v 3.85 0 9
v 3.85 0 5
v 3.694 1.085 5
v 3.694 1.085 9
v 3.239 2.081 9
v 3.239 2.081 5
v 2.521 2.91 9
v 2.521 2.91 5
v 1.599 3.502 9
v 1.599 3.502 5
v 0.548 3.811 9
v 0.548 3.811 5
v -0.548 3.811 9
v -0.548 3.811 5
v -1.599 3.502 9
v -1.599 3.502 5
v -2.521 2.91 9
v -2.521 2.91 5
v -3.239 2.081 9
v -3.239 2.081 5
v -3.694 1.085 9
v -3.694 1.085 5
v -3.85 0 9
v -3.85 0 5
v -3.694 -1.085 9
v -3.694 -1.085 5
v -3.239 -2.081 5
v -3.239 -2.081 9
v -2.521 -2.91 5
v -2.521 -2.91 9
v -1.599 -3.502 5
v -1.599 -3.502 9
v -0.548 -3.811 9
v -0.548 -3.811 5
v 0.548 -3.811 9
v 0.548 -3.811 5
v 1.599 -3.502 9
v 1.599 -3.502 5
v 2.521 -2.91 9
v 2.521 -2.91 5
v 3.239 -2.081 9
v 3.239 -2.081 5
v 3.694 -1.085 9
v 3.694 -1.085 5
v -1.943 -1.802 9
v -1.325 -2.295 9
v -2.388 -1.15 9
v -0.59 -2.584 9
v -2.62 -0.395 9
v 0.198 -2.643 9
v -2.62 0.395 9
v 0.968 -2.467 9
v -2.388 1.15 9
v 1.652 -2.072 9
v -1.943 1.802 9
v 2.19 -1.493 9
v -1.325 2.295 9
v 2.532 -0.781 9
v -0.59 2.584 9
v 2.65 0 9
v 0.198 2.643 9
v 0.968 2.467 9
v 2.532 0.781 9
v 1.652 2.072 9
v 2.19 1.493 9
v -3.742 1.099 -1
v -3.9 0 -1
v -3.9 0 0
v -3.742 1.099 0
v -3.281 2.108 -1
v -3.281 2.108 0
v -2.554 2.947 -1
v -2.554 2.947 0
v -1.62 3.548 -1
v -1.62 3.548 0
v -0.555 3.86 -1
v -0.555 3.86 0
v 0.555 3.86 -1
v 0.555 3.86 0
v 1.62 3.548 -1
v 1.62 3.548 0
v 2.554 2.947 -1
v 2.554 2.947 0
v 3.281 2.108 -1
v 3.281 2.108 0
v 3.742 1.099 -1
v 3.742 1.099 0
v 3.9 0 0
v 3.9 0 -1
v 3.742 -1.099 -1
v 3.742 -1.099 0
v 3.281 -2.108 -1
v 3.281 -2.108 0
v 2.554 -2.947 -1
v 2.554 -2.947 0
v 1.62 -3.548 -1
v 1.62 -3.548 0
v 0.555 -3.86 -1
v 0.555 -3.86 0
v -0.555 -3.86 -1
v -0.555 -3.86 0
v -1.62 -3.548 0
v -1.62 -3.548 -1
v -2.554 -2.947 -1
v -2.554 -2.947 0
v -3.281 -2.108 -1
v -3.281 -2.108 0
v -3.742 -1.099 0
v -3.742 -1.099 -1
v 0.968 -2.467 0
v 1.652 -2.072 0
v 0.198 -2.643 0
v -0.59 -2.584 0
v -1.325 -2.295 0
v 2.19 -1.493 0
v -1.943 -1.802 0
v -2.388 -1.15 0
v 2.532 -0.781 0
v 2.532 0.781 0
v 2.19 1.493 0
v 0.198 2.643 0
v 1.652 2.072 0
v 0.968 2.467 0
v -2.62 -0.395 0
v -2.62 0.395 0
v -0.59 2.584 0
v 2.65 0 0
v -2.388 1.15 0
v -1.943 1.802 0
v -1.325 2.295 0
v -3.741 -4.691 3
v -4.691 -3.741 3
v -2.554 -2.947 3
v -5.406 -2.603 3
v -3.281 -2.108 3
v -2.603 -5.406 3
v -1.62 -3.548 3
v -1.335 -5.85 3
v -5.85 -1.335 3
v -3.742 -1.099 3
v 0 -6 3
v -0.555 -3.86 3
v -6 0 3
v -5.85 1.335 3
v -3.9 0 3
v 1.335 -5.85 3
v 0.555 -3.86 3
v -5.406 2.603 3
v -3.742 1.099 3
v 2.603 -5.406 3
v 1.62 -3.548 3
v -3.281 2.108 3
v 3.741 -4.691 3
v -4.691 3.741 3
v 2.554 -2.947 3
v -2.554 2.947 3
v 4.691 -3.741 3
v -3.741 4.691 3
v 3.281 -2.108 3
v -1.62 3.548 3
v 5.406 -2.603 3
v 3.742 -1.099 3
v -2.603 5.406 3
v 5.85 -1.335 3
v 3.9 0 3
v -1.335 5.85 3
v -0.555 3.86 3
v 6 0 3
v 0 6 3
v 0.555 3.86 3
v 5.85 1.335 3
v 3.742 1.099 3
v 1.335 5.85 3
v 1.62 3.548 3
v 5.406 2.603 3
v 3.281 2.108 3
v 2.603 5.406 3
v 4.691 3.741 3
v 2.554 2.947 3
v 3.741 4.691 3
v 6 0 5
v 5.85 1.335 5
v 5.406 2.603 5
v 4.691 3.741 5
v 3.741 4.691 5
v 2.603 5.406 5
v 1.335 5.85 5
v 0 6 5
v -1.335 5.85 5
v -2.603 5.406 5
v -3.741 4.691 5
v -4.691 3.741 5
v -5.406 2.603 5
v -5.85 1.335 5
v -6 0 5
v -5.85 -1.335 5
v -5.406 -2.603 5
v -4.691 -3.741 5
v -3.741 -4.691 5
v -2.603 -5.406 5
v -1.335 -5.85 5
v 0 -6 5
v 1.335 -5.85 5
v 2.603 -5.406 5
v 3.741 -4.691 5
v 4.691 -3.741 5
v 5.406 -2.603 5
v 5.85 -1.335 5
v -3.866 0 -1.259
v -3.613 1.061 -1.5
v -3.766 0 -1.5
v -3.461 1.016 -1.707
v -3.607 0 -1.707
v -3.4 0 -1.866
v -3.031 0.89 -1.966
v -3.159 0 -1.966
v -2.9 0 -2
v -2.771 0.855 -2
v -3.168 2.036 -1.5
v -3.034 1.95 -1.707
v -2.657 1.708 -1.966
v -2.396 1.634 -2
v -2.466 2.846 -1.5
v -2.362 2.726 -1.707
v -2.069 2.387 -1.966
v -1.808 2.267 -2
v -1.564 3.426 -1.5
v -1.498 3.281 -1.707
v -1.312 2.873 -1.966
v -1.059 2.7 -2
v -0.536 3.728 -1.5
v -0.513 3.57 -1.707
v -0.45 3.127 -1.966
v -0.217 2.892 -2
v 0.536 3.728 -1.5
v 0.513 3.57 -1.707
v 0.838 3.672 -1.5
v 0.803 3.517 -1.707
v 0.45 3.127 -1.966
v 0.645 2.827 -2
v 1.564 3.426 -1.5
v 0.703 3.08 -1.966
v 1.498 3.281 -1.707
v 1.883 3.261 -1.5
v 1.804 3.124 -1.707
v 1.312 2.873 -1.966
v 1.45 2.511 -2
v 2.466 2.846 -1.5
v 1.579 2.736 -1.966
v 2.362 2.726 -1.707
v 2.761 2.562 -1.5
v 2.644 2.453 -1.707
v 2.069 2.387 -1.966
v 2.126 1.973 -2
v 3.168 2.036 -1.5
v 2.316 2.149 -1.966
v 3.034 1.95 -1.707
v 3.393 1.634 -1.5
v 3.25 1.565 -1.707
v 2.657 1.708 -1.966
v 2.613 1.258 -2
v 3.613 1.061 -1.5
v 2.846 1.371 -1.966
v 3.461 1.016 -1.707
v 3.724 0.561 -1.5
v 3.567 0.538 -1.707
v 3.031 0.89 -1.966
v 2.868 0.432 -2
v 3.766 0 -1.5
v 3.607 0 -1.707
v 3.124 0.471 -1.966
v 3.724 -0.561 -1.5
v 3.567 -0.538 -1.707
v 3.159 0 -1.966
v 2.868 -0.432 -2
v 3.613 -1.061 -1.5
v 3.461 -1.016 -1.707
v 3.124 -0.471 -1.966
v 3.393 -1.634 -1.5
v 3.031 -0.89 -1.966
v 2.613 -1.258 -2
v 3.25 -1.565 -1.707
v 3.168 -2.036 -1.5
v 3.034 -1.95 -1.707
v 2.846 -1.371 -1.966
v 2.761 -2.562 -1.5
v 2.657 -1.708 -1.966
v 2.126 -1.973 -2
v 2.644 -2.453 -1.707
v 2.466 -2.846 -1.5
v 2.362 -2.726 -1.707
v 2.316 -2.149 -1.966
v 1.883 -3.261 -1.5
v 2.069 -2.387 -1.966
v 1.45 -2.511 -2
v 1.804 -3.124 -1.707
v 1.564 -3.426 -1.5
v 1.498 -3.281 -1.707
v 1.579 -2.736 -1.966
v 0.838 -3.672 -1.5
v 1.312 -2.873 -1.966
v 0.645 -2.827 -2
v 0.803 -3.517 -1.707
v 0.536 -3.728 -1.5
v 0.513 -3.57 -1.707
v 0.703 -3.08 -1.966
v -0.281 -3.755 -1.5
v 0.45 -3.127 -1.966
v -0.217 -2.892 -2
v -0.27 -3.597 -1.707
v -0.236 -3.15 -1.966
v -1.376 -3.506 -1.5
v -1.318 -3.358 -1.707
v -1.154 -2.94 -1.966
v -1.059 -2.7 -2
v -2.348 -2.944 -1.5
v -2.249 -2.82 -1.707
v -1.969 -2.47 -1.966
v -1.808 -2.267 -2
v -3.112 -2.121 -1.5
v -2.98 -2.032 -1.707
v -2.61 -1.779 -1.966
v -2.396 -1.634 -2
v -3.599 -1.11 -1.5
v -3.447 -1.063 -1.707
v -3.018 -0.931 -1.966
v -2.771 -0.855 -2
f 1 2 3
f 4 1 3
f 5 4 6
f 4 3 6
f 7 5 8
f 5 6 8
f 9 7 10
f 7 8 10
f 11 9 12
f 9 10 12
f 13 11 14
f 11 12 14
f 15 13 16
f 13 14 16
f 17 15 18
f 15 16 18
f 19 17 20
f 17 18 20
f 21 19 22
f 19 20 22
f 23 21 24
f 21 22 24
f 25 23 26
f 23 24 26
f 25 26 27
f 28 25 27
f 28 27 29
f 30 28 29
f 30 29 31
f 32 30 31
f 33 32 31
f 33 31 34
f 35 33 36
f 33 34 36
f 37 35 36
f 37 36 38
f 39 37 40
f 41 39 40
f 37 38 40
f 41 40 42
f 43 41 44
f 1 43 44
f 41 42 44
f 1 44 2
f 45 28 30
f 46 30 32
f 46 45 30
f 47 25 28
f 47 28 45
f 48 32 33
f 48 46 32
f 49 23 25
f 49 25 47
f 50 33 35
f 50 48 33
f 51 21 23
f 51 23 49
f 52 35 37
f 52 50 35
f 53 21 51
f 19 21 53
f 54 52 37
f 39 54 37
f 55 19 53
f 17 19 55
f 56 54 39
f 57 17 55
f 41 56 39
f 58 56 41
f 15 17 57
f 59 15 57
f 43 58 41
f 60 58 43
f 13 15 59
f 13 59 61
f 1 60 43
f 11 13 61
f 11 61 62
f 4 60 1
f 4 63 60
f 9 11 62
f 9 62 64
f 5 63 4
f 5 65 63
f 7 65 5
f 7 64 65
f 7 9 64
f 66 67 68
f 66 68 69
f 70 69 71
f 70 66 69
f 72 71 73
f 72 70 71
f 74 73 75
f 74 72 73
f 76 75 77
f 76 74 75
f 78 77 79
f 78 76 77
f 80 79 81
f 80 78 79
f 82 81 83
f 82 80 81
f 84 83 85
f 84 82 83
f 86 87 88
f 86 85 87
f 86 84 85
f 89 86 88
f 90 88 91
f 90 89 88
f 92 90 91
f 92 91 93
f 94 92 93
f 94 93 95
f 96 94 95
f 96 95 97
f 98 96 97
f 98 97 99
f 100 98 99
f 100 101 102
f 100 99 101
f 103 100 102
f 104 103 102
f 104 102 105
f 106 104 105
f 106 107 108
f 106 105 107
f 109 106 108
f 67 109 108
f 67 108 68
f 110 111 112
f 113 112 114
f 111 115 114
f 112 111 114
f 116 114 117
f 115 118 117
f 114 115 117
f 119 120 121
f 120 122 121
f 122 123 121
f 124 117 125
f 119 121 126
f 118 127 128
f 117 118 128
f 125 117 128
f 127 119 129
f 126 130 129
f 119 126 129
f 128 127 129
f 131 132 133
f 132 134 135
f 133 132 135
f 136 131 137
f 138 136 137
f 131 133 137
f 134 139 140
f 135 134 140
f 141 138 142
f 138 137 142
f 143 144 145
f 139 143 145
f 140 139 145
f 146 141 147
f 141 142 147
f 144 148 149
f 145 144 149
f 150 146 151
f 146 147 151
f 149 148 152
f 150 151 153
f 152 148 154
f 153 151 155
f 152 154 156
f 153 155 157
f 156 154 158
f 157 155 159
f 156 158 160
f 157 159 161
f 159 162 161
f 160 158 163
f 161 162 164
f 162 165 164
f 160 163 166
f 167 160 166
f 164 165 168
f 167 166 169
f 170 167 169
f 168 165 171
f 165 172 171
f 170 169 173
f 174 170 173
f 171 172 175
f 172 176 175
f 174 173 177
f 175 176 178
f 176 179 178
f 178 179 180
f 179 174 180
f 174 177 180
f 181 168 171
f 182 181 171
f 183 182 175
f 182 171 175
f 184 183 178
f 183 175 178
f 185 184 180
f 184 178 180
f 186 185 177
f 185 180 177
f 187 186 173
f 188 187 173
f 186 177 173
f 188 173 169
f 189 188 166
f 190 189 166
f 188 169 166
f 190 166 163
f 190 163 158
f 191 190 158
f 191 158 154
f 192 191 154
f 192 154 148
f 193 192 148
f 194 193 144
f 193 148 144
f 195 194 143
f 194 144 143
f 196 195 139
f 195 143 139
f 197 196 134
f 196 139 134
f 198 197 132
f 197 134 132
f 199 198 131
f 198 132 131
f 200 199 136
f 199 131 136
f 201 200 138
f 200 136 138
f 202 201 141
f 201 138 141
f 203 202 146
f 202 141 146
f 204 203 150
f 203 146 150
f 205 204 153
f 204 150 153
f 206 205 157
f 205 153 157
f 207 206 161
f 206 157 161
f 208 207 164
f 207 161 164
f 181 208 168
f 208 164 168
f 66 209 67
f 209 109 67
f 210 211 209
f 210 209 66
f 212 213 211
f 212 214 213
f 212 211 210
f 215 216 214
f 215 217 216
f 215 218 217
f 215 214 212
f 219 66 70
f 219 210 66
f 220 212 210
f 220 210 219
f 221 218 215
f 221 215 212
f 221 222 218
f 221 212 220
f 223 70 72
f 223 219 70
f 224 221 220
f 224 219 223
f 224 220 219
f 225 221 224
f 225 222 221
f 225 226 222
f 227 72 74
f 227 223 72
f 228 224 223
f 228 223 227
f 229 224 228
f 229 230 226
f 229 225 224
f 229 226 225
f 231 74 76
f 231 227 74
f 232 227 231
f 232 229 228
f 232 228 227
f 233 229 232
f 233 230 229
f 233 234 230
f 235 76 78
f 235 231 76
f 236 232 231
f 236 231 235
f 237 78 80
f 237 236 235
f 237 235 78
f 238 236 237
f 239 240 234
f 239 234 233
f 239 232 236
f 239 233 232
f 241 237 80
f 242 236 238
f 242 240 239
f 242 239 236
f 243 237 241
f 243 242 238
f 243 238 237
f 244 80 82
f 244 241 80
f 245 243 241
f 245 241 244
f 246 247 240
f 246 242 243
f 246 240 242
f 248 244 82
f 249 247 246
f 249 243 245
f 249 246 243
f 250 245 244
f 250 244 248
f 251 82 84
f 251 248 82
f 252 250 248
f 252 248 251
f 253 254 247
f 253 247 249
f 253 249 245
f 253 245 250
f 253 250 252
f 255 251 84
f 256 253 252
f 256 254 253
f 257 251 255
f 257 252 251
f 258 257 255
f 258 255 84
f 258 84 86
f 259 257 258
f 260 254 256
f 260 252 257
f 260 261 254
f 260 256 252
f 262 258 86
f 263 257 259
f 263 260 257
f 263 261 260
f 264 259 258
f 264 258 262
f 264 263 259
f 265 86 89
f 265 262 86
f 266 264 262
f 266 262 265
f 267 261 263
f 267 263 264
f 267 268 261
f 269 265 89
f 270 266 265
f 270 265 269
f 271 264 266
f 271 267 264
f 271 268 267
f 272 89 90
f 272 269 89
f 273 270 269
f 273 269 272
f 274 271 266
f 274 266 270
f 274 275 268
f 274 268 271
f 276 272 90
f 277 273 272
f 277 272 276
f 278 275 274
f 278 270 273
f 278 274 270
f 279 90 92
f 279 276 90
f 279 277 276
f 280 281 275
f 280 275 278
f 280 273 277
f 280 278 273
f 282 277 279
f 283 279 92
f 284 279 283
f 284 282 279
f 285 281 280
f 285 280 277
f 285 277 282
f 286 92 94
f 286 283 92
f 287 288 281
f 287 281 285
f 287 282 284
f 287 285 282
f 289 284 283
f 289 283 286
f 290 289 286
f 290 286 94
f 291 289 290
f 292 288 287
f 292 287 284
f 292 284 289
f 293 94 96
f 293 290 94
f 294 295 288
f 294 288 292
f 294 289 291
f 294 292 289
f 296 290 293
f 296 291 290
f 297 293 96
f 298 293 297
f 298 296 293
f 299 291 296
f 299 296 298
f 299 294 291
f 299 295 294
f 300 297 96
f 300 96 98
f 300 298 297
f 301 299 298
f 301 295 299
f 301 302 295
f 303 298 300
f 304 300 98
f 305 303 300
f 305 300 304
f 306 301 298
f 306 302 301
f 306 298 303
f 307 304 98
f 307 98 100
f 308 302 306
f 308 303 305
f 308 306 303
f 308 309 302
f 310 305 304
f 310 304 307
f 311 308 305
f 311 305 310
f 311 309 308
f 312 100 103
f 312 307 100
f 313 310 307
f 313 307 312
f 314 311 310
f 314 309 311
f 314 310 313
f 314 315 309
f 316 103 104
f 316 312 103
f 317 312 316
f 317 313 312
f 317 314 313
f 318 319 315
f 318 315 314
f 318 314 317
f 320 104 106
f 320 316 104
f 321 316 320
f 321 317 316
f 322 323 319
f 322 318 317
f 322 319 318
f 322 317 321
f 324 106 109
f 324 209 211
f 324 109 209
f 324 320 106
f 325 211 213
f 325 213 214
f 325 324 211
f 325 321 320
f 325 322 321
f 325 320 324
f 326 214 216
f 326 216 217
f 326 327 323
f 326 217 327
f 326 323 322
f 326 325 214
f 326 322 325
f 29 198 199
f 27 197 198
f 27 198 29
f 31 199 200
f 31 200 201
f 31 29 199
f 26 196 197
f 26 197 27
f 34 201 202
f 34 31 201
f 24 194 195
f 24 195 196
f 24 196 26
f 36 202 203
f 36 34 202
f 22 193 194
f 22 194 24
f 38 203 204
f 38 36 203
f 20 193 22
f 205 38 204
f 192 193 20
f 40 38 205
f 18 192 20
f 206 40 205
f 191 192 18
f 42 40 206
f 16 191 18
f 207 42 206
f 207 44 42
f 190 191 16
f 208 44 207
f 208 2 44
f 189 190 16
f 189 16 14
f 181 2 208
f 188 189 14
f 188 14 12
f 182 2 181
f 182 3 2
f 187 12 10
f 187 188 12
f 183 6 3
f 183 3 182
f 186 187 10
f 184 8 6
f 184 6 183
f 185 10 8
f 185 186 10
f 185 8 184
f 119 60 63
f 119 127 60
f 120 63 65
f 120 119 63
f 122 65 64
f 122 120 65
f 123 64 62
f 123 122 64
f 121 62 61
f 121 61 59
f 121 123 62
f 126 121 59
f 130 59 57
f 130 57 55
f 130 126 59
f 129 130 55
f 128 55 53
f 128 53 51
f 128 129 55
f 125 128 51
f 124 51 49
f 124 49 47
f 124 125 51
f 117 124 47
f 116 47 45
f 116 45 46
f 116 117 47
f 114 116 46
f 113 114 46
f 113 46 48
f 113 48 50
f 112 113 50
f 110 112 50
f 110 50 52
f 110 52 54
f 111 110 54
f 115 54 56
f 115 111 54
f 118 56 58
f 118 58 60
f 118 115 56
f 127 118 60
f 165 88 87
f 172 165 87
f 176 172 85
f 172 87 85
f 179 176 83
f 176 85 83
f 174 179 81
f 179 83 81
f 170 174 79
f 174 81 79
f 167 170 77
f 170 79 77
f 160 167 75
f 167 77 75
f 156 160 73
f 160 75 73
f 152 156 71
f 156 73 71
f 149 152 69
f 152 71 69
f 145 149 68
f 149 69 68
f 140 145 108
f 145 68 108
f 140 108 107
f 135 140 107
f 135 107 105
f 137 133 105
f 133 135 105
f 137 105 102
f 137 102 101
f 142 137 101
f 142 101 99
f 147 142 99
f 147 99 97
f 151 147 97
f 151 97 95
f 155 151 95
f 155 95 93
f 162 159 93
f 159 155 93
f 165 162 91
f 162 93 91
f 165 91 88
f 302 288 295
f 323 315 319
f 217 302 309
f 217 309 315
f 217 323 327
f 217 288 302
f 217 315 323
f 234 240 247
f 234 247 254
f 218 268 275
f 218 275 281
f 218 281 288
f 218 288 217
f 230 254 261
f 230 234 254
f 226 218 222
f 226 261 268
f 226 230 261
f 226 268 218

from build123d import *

# Parameters (mm, degrees)
SKETCH1_R           = 3.9
SKETCH1_R_2         = 2.65
BOSS_EXTRUDE1_DEPTH = 5
BOSS_EXTRUDE2_START = -2
SKETCH2_R           = 6
SKETCH2_R_2         = 2.65
BOSS_EXTRUDE2_DEPTH = 2
BOSS_EXTRUDE3_START = 2
SKETCH3_R           = 3.9
BOSS_EXTRUDE3_DEPTH = 2
FILLET1_R           = 1
SKETCH4_R           = 3.85
SKETCH4_R_2         = 2.65
BOSS_EXTRUDE4_DEPTH = 4


with BuildPart() as part:
    # Sketch1 → Boss-Extrude1 (new body)
    with BuildSketch(Plane.XY):
        Circle(SKETCH1_R)
        Circle(SKETCH1_R_2, mode=Mode.SUBTRACT)
    extrude(amount=BOSS_EXTRUDE1_DEPTH)

    # Sketch2 → Boss-Extrude2 (add)
    with BuildSketch(Plane.XY.offset(5).offset(BOSS_EXTRUDE2_START)):
        Circle(SKETCH2_R)
        Circle(SKETCH2_R_2, mode=Mode.SUBTRACT)
    extrude(amount=BOSS_EXTRUDE2_DEPTH)

    # Sketch3 → Boss-Extrude3 (add)
    with BuildSketch(Plane(origin=(0, 0, 0), x_dir=(-1, 0, 0), z_dir=(0, 0, -1)).offset(BOSS_EXTRUDE3_START)):
        Circle(SKETCH3_R)
    extrude(amount=-BOSS_EXTRUDE3_DEPTH)

    # Fillet1
    fillet1_edges = [part.edges().sort_by_distance(p)[0] for p in [
        (3.9, 0, -2),
    ]]
    fillet(fillet1_edges, radius=FILLET1_R)

    # Sketch4 → Boss-Extrude4 (add)
    with BuildSketch(Plane.XY.offset(5)):
        Circle(SKETCH4_R)
        Circle(SKETCH4_R_2, mode=Mode.SUBTRACT)
    extrude(amount=BOSS_EXTRUDE4_DEPTH)


solid = part.part
